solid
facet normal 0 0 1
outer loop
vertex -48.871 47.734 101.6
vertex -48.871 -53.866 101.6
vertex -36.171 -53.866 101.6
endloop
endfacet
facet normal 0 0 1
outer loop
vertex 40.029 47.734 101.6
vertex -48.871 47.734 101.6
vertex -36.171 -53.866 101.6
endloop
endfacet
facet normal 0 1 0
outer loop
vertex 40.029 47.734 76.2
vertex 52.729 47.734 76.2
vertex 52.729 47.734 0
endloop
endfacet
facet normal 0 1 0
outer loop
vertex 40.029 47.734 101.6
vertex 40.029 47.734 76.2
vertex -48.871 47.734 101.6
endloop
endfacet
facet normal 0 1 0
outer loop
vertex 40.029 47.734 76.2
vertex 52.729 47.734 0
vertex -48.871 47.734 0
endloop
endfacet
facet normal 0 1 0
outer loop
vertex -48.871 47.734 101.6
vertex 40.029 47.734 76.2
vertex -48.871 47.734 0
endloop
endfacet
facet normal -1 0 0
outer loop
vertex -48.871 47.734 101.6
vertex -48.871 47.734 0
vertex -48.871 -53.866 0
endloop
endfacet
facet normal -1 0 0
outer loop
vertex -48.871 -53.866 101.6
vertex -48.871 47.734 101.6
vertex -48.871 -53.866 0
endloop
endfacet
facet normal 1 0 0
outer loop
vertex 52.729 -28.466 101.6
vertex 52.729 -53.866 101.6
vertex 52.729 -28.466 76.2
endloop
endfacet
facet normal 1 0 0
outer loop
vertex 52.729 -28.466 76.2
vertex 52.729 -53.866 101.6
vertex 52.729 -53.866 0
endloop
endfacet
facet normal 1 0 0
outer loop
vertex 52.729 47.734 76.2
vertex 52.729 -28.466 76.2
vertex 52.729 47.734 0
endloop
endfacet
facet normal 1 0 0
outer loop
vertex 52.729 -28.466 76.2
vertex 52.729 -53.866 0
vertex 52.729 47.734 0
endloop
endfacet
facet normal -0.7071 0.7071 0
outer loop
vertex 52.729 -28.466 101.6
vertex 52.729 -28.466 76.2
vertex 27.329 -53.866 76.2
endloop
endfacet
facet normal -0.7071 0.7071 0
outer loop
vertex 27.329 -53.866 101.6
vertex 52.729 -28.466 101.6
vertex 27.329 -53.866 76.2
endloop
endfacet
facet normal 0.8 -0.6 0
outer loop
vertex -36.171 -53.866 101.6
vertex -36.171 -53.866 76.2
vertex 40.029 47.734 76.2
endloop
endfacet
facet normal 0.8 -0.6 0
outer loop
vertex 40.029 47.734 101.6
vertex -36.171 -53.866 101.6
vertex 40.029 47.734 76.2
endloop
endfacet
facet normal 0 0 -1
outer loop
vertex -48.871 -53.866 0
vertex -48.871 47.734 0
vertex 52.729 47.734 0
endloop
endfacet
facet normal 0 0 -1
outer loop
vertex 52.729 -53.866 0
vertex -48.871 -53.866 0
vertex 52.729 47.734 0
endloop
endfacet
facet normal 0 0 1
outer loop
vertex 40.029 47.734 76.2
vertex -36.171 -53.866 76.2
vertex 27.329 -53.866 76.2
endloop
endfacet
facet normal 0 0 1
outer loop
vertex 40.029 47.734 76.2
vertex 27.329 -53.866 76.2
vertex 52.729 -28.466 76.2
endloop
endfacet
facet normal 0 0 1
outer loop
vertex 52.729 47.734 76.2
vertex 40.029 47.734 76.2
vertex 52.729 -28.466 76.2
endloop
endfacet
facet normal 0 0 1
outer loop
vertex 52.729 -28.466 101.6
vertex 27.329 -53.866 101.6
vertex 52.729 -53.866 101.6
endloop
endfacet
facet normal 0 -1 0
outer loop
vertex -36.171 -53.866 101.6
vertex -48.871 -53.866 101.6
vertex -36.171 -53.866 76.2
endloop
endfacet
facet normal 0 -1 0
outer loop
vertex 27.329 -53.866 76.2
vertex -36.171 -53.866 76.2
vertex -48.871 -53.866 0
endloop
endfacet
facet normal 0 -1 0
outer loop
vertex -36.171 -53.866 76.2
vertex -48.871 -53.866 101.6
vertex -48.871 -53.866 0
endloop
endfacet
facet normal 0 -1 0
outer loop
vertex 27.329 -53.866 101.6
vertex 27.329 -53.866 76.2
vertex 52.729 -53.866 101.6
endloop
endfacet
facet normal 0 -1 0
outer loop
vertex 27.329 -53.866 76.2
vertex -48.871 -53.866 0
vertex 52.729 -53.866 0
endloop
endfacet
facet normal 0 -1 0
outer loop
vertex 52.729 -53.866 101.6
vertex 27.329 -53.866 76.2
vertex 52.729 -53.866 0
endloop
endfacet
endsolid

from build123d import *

# Parameters (mm, degrees)
F0_W     = 101.6
F0_H     = 101.6
F1_DEPTH = 76.2
F3_DEPTH = 25.4
F5_DEPTH = 25.4


with BuildPart() as f1:
    # F0 (on Top) → F1 (new body)
    with BuildSketch(Plane.XY):
        with Locations((1.929369, -3.065663)):
            Rectangle(F0_W, F0_H)
    extrude(amount=F1_DEPTH)

    # F2 (on face) → F3 (join)
    with BuildSketch(Plane.XY.offset(76.2)):
        Polygon((-48.870631, 47.734337), (-48.870631, -53.865663), (-36.170631, -53.865663), (40.029369, 47.734337), align=None)
    extrude(amount=F3_DEPTH)

    # F4 (on face) → F5 (join)
    with BuildSketch(Plane.XY.offset(76.2)):
        Polygon((52.729369, -28.465663), (27.329369, -53.865663), (52.729369, -53.865663), align=None)
    extrude(amount=F5_DEPTH)


solid = f1.part
